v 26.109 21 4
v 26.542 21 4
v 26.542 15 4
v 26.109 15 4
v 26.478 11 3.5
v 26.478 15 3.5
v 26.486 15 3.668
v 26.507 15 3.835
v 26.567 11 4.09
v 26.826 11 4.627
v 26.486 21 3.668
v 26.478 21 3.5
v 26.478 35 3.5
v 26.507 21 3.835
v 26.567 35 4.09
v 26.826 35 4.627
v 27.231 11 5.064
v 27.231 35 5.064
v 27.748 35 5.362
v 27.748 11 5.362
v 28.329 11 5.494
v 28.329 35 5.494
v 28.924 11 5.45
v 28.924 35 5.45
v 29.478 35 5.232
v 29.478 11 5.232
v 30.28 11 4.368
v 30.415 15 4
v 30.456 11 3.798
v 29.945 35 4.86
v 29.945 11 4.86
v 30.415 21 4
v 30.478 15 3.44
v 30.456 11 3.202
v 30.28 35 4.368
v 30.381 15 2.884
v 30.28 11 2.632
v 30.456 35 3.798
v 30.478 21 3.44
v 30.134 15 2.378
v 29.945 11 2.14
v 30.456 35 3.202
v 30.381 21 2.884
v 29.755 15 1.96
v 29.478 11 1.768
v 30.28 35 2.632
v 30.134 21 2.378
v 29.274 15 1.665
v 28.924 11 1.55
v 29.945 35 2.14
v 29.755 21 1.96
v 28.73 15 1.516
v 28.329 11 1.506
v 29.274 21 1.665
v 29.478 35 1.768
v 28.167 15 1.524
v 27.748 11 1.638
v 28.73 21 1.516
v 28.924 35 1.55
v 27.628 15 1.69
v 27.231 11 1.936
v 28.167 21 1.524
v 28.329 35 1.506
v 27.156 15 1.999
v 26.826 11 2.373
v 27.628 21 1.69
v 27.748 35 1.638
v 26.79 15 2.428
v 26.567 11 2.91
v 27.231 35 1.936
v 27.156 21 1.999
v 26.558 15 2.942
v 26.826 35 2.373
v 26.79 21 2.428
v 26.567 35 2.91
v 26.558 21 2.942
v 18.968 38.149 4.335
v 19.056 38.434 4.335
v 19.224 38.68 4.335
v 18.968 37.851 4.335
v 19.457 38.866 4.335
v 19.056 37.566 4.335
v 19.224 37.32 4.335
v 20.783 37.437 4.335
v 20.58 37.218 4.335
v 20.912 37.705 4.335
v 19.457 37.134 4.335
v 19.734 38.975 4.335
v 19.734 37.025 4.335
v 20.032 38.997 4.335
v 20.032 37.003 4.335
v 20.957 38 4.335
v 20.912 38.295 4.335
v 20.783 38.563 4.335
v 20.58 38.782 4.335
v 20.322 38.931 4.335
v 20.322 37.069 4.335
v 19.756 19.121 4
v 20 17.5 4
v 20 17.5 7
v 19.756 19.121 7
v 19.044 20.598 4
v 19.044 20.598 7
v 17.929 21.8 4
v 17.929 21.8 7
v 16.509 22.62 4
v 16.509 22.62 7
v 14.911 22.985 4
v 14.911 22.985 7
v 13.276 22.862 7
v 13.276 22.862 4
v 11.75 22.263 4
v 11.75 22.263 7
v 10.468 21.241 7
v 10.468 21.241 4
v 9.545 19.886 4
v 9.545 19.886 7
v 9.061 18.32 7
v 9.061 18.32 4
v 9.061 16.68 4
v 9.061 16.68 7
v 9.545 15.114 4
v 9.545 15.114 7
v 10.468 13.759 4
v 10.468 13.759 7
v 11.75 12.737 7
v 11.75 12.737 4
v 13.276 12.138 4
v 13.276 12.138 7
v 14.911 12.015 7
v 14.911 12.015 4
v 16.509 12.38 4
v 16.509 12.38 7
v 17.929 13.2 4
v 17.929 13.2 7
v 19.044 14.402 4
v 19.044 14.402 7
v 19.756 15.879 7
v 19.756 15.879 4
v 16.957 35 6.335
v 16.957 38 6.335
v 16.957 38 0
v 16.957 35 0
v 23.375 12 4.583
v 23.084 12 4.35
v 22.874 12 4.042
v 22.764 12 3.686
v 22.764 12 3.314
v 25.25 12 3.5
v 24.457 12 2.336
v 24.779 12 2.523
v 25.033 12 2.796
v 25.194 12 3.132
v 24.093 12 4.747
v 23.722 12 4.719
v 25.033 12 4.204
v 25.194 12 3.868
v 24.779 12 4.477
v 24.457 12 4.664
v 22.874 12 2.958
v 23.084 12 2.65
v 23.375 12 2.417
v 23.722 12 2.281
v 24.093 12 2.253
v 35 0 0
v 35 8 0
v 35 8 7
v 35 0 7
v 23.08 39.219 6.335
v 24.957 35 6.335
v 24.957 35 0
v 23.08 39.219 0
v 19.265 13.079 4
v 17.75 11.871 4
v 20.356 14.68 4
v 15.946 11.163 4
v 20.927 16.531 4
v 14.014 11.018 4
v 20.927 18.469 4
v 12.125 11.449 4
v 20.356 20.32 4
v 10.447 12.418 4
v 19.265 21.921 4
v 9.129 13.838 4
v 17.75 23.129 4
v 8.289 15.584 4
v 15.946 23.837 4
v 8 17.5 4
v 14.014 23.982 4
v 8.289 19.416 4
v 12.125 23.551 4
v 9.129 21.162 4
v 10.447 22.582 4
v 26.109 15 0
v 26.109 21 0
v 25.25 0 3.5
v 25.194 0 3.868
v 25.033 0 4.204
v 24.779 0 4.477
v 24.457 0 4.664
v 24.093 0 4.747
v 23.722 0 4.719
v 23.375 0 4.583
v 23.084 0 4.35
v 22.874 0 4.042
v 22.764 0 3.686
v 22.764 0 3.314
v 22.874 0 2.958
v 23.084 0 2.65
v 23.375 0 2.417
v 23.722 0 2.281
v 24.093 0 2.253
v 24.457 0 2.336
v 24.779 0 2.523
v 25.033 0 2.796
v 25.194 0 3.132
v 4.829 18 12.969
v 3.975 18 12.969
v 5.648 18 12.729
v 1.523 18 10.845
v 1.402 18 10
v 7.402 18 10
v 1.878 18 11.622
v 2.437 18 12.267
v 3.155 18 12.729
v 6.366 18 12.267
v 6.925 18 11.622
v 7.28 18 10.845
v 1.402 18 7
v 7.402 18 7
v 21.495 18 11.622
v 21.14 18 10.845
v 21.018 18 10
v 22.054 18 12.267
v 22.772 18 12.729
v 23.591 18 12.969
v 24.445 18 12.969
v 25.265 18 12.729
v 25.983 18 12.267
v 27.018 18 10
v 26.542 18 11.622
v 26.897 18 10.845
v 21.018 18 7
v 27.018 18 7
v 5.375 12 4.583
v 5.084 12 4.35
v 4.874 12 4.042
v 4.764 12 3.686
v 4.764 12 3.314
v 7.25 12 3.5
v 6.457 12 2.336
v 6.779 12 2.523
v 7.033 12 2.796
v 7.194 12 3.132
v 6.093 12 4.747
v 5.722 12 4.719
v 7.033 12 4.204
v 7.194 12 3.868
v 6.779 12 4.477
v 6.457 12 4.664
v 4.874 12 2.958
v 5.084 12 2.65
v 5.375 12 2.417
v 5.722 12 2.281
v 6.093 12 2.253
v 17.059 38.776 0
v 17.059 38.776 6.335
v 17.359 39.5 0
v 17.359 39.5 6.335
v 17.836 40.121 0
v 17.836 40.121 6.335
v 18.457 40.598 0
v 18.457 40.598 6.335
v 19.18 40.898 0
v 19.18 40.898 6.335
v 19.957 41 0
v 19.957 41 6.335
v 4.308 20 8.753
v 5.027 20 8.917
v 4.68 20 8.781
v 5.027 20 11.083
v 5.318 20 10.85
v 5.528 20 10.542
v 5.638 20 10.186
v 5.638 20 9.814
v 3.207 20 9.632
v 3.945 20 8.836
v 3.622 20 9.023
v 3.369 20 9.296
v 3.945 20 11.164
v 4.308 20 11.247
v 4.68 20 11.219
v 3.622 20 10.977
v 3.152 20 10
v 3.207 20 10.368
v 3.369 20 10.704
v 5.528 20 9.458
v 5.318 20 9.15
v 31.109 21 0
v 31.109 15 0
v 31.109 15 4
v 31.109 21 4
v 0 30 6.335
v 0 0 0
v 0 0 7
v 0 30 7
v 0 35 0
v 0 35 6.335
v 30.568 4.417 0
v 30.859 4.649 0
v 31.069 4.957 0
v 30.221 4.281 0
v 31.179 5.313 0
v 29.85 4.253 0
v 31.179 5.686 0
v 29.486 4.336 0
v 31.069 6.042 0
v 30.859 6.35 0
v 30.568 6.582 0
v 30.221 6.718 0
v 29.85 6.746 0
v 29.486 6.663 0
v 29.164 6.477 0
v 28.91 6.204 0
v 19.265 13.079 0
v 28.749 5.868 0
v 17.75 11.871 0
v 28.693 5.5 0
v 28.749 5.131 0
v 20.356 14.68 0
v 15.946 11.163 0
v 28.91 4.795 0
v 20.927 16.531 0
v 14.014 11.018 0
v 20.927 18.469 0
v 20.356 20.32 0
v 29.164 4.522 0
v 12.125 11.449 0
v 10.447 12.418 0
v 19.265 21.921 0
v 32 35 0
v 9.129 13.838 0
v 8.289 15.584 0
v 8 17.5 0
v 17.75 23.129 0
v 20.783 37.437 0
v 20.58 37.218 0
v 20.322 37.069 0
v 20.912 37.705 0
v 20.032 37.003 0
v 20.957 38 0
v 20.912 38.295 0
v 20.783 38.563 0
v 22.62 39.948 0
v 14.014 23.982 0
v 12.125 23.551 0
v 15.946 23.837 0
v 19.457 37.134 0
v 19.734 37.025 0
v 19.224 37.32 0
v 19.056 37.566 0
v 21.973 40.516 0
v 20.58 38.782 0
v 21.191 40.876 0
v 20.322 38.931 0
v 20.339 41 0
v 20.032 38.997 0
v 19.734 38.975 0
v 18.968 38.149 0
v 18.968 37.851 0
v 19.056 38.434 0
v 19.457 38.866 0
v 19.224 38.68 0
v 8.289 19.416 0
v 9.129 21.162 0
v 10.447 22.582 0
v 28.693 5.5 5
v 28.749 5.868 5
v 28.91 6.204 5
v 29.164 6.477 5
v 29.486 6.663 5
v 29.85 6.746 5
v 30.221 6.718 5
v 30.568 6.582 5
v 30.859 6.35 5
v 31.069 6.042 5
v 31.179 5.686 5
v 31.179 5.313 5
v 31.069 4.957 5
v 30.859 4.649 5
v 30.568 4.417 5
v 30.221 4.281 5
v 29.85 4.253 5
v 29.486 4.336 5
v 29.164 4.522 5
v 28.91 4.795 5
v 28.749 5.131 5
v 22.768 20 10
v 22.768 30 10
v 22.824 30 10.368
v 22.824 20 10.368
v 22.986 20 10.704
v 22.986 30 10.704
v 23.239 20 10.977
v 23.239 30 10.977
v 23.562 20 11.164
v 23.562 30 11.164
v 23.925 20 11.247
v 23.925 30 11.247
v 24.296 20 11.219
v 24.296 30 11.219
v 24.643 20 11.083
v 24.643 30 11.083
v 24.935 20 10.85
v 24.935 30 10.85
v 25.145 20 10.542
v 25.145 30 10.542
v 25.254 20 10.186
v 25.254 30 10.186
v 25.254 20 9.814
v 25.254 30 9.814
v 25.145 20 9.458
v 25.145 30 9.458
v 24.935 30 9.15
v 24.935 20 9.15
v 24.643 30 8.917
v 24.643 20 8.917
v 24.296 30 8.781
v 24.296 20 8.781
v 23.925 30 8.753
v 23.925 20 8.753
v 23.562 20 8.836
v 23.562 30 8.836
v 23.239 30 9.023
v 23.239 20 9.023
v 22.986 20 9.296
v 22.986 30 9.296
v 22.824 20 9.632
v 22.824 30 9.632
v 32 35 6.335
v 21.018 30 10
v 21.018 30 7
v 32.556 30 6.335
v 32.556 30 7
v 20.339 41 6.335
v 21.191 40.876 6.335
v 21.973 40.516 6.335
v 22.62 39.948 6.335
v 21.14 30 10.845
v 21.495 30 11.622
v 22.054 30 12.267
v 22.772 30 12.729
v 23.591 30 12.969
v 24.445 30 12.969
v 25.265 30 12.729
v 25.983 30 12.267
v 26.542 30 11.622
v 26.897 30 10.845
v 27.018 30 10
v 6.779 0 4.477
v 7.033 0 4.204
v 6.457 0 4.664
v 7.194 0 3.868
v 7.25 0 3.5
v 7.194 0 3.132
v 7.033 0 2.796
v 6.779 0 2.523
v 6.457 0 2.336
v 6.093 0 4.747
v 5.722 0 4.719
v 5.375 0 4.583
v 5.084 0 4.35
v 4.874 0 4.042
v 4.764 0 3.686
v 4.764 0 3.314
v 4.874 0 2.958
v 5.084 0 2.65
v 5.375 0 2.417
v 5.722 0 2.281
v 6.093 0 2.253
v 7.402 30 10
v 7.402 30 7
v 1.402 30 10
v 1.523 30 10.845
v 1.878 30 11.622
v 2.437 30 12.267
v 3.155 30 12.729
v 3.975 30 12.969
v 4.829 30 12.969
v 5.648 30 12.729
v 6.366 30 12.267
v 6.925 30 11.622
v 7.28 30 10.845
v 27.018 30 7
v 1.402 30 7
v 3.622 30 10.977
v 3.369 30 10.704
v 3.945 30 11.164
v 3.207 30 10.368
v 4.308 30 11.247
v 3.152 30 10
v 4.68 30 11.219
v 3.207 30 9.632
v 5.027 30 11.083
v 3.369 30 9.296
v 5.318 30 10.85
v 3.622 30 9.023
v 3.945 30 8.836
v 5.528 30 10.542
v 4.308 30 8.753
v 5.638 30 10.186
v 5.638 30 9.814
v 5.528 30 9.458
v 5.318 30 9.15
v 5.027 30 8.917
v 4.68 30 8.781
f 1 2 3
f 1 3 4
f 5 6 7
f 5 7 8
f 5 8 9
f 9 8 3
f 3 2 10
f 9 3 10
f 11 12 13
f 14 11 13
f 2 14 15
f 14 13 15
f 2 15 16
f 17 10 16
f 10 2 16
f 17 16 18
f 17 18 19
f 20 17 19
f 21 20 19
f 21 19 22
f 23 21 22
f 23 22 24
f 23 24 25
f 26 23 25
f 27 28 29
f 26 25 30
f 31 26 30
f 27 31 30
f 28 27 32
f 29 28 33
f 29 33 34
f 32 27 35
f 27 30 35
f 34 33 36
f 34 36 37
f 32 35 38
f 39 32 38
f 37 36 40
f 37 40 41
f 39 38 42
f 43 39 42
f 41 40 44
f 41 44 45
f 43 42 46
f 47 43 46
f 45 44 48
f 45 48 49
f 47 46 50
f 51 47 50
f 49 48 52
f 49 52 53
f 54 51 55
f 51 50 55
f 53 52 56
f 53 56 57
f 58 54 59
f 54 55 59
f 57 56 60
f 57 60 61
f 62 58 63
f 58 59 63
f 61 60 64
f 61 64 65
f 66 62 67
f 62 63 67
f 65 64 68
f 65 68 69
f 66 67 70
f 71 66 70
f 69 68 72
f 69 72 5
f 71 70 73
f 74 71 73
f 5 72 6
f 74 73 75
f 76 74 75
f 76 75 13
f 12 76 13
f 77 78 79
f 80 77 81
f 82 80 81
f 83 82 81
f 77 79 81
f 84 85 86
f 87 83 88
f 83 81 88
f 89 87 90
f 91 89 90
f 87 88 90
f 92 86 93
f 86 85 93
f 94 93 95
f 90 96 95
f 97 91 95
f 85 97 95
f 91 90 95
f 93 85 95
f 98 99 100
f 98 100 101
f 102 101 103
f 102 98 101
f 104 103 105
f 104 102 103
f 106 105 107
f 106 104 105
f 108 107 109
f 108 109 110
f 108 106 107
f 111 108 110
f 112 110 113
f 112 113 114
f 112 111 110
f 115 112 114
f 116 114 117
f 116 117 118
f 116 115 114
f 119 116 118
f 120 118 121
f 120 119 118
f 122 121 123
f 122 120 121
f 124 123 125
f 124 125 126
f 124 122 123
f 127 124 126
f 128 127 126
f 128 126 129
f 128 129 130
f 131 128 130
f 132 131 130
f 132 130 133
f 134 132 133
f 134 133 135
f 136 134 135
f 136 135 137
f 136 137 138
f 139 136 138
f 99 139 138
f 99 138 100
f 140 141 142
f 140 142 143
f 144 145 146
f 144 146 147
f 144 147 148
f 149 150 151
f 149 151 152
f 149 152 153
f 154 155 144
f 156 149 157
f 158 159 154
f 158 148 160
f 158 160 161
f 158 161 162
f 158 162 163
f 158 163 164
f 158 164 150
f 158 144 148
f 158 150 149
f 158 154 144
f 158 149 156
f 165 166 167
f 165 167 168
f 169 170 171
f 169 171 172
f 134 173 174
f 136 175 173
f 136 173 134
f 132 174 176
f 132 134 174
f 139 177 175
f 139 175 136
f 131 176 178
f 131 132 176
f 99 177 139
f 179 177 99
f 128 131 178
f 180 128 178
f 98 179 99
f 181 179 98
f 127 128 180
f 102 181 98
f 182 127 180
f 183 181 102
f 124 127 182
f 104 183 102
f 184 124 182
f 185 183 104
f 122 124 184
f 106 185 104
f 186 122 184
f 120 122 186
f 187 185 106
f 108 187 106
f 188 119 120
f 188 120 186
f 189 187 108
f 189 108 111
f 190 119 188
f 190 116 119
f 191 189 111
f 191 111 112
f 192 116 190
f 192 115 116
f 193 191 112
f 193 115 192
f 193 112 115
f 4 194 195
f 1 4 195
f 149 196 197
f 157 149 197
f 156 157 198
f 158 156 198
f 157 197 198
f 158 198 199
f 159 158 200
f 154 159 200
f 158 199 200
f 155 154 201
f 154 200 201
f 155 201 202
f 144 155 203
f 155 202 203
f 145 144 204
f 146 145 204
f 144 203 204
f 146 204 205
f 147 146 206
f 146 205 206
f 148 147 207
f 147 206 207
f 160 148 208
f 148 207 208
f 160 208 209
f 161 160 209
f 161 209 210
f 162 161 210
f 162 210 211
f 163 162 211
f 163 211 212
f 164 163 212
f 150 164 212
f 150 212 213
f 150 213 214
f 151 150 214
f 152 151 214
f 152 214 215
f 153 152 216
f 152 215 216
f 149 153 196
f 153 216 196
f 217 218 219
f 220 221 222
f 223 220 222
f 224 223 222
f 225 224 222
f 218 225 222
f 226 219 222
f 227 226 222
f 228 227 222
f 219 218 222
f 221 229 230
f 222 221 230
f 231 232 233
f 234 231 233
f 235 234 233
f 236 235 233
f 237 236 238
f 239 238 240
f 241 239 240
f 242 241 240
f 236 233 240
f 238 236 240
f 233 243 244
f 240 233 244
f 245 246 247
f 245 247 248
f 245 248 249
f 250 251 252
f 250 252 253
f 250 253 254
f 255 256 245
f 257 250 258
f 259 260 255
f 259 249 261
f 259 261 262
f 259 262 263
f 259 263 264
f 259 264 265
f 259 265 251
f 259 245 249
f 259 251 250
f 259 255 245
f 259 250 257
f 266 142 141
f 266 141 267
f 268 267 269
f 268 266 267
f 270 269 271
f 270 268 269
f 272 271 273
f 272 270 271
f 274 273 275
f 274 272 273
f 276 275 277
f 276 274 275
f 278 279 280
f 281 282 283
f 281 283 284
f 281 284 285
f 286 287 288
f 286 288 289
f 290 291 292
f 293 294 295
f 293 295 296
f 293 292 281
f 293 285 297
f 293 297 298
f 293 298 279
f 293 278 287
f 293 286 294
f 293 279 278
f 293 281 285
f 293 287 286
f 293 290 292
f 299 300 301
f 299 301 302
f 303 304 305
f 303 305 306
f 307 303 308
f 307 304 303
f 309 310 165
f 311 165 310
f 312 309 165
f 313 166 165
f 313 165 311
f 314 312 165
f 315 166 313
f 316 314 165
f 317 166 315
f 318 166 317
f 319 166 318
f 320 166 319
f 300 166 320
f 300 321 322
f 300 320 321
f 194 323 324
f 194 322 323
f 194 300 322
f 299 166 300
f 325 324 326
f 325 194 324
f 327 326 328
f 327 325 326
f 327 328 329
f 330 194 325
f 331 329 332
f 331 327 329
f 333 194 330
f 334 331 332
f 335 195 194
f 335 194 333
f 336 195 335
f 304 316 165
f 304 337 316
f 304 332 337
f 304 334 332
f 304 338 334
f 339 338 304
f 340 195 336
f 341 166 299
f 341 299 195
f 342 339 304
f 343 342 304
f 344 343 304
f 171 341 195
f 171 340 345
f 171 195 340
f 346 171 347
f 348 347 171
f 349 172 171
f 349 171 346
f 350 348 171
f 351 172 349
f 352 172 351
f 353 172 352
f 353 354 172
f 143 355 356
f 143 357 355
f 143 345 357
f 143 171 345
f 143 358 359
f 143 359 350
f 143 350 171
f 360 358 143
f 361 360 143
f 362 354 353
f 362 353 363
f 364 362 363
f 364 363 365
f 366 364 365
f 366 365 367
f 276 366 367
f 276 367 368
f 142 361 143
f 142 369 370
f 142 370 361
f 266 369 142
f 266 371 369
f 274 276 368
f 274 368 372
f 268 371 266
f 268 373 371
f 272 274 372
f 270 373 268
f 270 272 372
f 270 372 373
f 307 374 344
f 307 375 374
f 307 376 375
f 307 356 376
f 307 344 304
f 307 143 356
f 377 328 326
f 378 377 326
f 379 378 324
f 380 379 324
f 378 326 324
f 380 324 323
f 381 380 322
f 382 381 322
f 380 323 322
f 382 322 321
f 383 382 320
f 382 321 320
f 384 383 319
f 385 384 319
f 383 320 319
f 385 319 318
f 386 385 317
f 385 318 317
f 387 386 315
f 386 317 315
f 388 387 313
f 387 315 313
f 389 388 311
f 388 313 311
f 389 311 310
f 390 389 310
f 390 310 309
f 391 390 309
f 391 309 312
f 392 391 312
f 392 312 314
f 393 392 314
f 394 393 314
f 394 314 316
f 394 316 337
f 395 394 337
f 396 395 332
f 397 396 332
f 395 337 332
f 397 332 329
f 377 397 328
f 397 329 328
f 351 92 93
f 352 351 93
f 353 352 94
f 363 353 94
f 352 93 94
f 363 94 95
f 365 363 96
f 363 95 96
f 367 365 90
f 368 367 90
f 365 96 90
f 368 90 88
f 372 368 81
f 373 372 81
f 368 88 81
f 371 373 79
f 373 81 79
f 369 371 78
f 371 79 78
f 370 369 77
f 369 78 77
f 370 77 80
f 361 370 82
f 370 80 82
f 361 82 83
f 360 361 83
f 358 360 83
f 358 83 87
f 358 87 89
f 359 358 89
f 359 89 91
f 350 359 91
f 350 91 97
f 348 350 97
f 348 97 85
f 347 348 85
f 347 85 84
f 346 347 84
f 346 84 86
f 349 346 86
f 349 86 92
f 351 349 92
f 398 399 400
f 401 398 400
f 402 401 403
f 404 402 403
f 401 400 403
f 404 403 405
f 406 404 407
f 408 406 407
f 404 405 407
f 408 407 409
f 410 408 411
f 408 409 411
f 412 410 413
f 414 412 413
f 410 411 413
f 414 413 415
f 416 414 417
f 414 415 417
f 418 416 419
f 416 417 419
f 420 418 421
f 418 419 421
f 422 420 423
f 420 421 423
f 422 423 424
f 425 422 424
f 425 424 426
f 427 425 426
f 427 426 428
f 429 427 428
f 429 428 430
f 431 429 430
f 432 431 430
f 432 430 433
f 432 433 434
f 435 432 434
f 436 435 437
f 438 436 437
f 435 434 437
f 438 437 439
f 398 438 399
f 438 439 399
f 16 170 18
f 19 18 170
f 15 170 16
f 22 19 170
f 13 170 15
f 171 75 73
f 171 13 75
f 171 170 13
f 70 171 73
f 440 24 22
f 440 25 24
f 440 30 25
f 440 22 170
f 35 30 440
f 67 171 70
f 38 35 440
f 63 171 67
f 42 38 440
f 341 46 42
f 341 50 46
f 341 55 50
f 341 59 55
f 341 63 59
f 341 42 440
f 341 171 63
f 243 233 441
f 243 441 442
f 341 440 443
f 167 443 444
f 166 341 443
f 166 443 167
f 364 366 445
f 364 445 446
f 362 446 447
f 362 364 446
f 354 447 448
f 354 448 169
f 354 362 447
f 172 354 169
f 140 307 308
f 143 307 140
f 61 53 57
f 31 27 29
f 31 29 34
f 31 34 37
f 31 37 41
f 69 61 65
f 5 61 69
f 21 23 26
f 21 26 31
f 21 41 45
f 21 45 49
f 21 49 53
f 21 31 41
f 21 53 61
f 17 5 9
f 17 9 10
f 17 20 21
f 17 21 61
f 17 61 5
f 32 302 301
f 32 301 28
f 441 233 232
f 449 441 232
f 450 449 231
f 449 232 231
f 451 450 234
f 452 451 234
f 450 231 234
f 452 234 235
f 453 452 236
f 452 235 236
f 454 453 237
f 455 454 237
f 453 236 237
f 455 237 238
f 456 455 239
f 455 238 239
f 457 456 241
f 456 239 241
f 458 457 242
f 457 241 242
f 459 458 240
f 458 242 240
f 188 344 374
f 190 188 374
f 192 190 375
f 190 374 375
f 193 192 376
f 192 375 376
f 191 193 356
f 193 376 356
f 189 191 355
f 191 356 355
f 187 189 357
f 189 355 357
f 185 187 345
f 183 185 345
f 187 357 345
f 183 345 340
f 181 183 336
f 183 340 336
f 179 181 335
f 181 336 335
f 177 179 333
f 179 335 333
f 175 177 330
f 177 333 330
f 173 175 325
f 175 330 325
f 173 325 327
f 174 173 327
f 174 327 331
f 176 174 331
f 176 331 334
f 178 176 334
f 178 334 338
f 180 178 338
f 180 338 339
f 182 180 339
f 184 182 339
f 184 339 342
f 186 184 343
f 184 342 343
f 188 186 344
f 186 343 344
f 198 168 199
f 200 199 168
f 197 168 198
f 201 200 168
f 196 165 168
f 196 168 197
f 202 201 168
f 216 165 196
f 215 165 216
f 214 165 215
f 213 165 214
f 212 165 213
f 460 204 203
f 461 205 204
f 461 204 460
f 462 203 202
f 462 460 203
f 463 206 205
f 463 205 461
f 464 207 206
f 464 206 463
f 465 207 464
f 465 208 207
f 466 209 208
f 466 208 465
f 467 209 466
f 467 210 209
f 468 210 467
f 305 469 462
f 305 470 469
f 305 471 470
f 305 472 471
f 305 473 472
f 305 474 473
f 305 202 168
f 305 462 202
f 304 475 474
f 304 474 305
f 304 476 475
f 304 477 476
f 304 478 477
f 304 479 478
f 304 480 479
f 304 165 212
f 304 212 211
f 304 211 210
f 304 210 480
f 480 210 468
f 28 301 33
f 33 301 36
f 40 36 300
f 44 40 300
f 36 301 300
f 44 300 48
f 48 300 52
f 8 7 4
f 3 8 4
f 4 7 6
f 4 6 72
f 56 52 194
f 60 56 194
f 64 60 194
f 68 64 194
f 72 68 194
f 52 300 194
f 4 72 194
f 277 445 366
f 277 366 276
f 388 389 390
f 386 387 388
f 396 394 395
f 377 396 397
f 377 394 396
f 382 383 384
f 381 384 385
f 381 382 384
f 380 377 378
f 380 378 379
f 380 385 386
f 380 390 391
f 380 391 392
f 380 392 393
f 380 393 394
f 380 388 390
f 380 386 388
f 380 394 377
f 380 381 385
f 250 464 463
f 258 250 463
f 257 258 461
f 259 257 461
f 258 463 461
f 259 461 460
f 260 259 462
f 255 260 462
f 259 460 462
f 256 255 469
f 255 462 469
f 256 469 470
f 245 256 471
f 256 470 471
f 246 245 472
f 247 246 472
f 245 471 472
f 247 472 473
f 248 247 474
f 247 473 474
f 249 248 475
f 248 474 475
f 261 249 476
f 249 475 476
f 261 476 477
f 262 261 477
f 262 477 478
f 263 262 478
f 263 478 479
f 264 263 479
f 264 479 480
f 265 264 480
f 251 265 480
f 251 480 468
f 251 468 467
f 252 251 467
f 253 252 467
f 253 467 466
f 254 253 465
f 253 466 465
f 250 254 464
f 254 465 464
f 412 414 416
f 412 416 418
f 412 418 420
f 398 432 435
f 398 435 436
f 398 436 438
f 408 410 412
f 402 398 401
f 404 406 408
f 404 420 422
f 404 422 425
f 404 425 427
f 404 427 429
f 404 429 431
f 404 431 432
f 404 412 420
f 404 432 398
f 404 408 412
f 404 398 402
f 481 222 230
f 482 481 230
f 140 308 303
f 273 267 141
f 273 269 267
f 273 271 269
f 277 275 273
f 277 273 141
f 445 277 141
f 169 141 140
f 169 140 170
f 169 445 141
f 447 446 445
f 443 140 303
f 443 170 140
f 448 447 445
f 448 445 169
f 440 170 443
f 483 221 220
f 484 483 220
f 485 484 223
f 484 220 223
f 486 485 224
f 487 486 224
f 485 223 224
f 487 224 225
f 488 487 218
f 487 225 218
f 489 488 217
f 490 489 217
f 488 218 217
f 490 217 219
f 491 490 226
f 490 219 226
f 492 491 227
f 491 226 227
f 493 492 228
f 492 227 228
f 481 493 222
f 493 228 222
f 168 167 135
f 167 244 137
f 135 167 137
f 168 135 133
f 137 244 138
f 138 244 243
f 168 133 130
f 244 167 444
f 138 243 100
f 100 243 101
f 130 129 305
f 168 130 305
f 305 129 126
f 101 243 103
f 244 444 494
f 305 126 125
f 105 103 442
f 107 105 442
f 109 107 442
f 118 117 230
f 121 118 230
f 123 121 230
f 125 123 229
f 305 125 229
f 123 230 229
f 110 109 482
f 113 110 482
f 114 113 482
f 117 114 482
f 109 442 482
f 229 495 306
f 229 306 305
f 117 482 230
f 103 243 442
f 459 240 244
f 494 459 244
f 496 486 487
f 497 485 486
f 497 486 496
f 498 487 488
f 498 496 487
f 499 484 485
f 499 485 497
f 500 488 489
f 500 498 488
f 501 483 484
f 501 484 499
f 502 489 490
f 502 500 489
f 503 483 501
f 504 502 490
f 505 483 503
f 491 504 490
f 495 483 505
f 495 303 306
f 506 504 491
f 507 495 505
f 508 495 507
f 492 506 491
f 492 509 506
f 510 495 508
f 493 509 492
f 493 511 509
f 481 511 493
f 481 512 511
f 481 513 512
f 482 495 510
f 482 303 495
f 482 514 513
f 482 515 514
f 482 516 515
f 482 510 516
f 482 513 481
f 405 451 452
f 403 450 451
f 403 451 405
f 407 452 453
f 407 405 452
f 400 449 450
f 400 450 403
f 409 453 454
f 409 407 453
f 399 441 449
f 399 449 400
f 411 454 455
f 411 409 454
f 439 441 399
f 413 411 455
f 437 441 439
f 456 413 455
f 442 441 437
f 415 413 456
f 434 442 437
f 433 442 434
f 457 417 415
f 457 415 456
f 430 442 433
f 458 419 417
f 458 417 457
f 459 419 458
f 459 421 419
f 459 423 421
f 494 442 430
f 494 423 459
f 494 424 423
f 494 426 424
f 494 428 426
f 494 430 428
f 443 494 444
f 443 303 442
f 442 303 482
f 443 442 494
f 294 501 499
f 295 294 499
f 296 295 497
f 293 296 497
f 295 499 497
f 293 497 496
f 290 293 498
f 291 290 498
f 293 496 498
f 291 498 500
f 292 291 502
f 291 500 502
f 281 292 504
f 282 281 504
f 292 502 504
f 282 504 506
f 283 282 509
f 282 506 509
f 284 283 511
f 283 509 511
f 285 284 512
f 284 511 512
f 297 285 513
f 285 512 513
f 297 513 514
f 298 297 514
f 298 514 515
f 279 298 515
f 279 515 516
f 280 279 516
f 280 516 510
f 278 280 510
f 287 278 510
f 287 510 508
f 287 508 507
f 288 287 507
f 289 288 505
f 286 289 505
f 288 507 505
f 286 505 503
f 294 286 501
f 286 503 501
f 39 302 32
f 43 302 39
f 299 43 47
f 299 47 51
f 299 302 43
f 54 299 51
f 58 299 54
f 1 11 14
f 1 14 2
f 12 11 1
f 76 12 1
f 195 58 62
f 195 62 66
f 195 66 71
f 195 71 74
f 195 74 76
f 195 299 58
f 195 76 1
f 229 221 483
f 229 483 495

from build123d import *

# Parameters (mm, degrees)
SKETCH1_R           = 5.5
BOSS_EXTRUDE1_DEPTH = 7
SKETCH2_R           = 1.25
CUT_EXTRUDE1_DEPTH  = 12
SKETCH3_R           = 1.25
CUT_EXTRUDE2_DEPTH  = 12
BOSS_EXTRUDE3_DEPTH = 7
FILLET1_R           = 3
SKETCH5_R           = 1
CUT_EXTRUDE3_DEPTH  = 7
SKETCH6_R           = 3
SKETCH6_W           = 6
SKETCH6_H           = 6
BOSS_EXTRUDE5_DEPTH = 12
SKETCH8_R           = 1.25
CUT_EXTRUDE4_DEPTH  = 10
SKETCH9_R           = 2
CUT_EXTRUDE5_DEPTH  = 24
SKETCH10_W          = 5
SKETCH10_H          = 6
CUT_EXTRUDE6_DEPTH  = 4
SKETCH12_R          = 6.5
CUT_EXTRUDE9_DEPTH  = 4
SKETCH13_W          = 35
SKETCH13_H          = 0.258068079
CUT_EXTRUDE10_DEPTH = 11
SKETCH14_W          = 33.43687833
SKETCH14_H          = 0.407122994
CUT_EXTRUDE11_DEPTH = 11
SKETCH15_R          = 1
BOSS_EXTRUDE6_DEPTH = 2
SKETCH16_R          = 1.25
CUT_EXTRUDE12_DEPTH = 5


with BuildPart() as part:
    # Sketch1 → Boss-Extrude1 (new body)
    with BuildSketch(Plane.XY):
        Polygon((0, 0), (0, 35), (32, 35), (35, 8), (35, 0), align=None)
        with Locations((14.5, 17.5)):
            Circle(SKETCH1_R, mode=Mode.SUBTRACT)
    extrude(amount=BOSS_EXTRUDE1_DEPTH)

    # Sketch2 → Cut-Extrude1 (cut)
    with BuildSketch(Plane.XZ):
        with Locations((6, 3.5)):
            Circle(SKETCH2_R)
    extrude(amount=-CUT_EXTRUDE1_DEPTH, mode=Mode.SUBTRACT)

    # Sketch3 → Cut-Extrude2 (cut)
    with BuildSketch(Plane.XZ):
        with Locations((24, 3.5)):
            Circle(SKETCH3_R)
    extrude(amount=-CUT_EXTRUDE2_DEPTH, mode=Mode.SUBTRACT)

    # Sketch4 → Boss-Extrude3 (add)
    with BuildSketch(Plane.XY.offset(7)):
        Polygon((16.95692267, 41), (16.95692267, 35), (24.95692267, 35), (22.287605299, 41), align=None)
    extrude(amount=-BOSS_EXTRUDE3_DEPTH)

    # Fillet1
    fillet1_edges = [part.edges().sort_by_distance(p)[0] for p in [
        (22.287605299, 41, 3.5),
        (16.95692267, 41, 3.5),
    ]]
    fillet(fillet1_edges, radius=FILLET1_R)

    # Sketch5 → Cut-Extrude3 (cut)
    with BuildSketch(Plane.XY.offset(7)):
        with Locations((19.95692267, 38)):
            Circle(SKETCH5_R)
    extrude(amount=-CUT_EXTRUDE3_DEPTH, mode=Mode.SUBTRACT)

    # Sketch6 → Boss-Extrude5 (add)
    with BuildSketch(Plane(origin=(0, 18, 0), x_dir=(1, 0, 0), z_dir=(0, 1, 0))):
        with Locations((4.401568824, -10)):
            Circle(SKETCH6_R)
        with Locations((24.018340299, -10)):
            Circle(SKETCH6_R)
        with Locations((4.401568824, -7)):
            Rectangle(SKETCH6_W, SKETCH6_H)
        with Locations((24.018340299, -7)):
            Rectangle(SKETCH6_W, SKETCH6_H)
    extrude(amount=BOSS_EXTRUDE5_DEPTH)

    # Sketch8 → Cut-Extrude4 (cut)
    with BuildSketch(Plane(origin=(0, 30, 0), x_dir=(1, 0, 0), z_dir=(0, 1, 0))):
        with Locations(Location((4.401568824, -10, 0), (0, 0, 180))):
            Circle(SKETCH8_R)
        with Locations(Location((24.018340299, -10, 0), (0, 0, 180))):
            Circle(SKETCH8_R)
    extrude(amount=-CUT_EXTRUDE4_DEPTH, mode=Mode.SUBTRACT)

    # Sketch9 → Cut-Extrude5 (cut)
    with BuildSketch(Plane(origin=(0, 35, 0), x_dir=(1, 0, 0), z_dir=(0, 1, 0))):
        with Locations(Location((28.478461335, -3.5, 0), (0, 0, 180))):
            Circle(SKETCH9_R)
    extrude(amount=-CUT_EXTRUDE5_DEPTH, mode=Mode.SUBTRACT)

    # Sketch10 → Cut-Extrude6 (cut)
    with BuildSketch(Plane(origin=(0, 0, 0), x_dir=(-1, 0, 0), z_dir=(0, 0, -1))):
        with Locations((-28.609401926, 18)):
            Rectangle(SKETCH10_W, SKETCH10_H)
    extrude(amount=-CUT_EXTRUDE6_DEPTH, mode=Mode.SUBTRACT)

    # Sketch12 → Cut-Extrude9 (cut)
    with BuildSketch(Plane(origin=(0, 0, 0), x_dir=(-1, 0, 0), z_dir=(0, 0, -1))):
        with Locations((-14.5, 17.5)):
            Circle(SKETCH12_R)
    extrude(amount=-CUT_EXTRUDE9_DEPTH, mode=Mode.SUBTRACT)

    # Sketch13 → Cut-Extrude10 (cut)
    with BuildSketch(Plane(origin=(0, 41, 0), x_dir=(1, 0, 0), z_dir=(0, 1, 0))):
        with Locations((17.5, -6.870965961)):
            Rectangle(SKETCH13_W, SKETCH13_H)
    extrude(amount=-CUT_EXTRUDE10_DEPTH, mode=Mode.SUBTRACT)

    # Sketch14 → Cut-Extrude11 (cut)
    with BuildSketch(Plane(origin=(0, 41, 0), x_dir=(1, 0, 0), z_dir=(0, 1, 0))):
        with Locations((16.718439165, -6.538370424)):
            Rectangle(SKETCH14_W, SKETCH14_H)
    extrude(amount=-CUT_EXTRUDE11_DEPTH, mode=Mode.SUBTRACT)

    # Sketch15 → Boss-Extrude6 (add)
    with BuildSketch(Plane.XY.offset(6.334808927)):
        with Locations((19.95692267, 38)):
            Circle(SKETCH15_R)
    extrude(amount=-BOSS_EXTRUDE6_DEPTH)

    # Sketch16 → Cut-Extrude12 (cut)
    with BuildSketch(Plane(origin=(0, 0, 0), x_dir=(-1, 0, 0), z_dir=(0, 0, -1))):
        with Locations((-29.943004203, 5.499566532)):
            Circle(SKETCH16_R)
    extrude(amount=-CUT_EXTRUDE12_DEPTH, mode=Mode.SUBTRACT)


solid = part.part
